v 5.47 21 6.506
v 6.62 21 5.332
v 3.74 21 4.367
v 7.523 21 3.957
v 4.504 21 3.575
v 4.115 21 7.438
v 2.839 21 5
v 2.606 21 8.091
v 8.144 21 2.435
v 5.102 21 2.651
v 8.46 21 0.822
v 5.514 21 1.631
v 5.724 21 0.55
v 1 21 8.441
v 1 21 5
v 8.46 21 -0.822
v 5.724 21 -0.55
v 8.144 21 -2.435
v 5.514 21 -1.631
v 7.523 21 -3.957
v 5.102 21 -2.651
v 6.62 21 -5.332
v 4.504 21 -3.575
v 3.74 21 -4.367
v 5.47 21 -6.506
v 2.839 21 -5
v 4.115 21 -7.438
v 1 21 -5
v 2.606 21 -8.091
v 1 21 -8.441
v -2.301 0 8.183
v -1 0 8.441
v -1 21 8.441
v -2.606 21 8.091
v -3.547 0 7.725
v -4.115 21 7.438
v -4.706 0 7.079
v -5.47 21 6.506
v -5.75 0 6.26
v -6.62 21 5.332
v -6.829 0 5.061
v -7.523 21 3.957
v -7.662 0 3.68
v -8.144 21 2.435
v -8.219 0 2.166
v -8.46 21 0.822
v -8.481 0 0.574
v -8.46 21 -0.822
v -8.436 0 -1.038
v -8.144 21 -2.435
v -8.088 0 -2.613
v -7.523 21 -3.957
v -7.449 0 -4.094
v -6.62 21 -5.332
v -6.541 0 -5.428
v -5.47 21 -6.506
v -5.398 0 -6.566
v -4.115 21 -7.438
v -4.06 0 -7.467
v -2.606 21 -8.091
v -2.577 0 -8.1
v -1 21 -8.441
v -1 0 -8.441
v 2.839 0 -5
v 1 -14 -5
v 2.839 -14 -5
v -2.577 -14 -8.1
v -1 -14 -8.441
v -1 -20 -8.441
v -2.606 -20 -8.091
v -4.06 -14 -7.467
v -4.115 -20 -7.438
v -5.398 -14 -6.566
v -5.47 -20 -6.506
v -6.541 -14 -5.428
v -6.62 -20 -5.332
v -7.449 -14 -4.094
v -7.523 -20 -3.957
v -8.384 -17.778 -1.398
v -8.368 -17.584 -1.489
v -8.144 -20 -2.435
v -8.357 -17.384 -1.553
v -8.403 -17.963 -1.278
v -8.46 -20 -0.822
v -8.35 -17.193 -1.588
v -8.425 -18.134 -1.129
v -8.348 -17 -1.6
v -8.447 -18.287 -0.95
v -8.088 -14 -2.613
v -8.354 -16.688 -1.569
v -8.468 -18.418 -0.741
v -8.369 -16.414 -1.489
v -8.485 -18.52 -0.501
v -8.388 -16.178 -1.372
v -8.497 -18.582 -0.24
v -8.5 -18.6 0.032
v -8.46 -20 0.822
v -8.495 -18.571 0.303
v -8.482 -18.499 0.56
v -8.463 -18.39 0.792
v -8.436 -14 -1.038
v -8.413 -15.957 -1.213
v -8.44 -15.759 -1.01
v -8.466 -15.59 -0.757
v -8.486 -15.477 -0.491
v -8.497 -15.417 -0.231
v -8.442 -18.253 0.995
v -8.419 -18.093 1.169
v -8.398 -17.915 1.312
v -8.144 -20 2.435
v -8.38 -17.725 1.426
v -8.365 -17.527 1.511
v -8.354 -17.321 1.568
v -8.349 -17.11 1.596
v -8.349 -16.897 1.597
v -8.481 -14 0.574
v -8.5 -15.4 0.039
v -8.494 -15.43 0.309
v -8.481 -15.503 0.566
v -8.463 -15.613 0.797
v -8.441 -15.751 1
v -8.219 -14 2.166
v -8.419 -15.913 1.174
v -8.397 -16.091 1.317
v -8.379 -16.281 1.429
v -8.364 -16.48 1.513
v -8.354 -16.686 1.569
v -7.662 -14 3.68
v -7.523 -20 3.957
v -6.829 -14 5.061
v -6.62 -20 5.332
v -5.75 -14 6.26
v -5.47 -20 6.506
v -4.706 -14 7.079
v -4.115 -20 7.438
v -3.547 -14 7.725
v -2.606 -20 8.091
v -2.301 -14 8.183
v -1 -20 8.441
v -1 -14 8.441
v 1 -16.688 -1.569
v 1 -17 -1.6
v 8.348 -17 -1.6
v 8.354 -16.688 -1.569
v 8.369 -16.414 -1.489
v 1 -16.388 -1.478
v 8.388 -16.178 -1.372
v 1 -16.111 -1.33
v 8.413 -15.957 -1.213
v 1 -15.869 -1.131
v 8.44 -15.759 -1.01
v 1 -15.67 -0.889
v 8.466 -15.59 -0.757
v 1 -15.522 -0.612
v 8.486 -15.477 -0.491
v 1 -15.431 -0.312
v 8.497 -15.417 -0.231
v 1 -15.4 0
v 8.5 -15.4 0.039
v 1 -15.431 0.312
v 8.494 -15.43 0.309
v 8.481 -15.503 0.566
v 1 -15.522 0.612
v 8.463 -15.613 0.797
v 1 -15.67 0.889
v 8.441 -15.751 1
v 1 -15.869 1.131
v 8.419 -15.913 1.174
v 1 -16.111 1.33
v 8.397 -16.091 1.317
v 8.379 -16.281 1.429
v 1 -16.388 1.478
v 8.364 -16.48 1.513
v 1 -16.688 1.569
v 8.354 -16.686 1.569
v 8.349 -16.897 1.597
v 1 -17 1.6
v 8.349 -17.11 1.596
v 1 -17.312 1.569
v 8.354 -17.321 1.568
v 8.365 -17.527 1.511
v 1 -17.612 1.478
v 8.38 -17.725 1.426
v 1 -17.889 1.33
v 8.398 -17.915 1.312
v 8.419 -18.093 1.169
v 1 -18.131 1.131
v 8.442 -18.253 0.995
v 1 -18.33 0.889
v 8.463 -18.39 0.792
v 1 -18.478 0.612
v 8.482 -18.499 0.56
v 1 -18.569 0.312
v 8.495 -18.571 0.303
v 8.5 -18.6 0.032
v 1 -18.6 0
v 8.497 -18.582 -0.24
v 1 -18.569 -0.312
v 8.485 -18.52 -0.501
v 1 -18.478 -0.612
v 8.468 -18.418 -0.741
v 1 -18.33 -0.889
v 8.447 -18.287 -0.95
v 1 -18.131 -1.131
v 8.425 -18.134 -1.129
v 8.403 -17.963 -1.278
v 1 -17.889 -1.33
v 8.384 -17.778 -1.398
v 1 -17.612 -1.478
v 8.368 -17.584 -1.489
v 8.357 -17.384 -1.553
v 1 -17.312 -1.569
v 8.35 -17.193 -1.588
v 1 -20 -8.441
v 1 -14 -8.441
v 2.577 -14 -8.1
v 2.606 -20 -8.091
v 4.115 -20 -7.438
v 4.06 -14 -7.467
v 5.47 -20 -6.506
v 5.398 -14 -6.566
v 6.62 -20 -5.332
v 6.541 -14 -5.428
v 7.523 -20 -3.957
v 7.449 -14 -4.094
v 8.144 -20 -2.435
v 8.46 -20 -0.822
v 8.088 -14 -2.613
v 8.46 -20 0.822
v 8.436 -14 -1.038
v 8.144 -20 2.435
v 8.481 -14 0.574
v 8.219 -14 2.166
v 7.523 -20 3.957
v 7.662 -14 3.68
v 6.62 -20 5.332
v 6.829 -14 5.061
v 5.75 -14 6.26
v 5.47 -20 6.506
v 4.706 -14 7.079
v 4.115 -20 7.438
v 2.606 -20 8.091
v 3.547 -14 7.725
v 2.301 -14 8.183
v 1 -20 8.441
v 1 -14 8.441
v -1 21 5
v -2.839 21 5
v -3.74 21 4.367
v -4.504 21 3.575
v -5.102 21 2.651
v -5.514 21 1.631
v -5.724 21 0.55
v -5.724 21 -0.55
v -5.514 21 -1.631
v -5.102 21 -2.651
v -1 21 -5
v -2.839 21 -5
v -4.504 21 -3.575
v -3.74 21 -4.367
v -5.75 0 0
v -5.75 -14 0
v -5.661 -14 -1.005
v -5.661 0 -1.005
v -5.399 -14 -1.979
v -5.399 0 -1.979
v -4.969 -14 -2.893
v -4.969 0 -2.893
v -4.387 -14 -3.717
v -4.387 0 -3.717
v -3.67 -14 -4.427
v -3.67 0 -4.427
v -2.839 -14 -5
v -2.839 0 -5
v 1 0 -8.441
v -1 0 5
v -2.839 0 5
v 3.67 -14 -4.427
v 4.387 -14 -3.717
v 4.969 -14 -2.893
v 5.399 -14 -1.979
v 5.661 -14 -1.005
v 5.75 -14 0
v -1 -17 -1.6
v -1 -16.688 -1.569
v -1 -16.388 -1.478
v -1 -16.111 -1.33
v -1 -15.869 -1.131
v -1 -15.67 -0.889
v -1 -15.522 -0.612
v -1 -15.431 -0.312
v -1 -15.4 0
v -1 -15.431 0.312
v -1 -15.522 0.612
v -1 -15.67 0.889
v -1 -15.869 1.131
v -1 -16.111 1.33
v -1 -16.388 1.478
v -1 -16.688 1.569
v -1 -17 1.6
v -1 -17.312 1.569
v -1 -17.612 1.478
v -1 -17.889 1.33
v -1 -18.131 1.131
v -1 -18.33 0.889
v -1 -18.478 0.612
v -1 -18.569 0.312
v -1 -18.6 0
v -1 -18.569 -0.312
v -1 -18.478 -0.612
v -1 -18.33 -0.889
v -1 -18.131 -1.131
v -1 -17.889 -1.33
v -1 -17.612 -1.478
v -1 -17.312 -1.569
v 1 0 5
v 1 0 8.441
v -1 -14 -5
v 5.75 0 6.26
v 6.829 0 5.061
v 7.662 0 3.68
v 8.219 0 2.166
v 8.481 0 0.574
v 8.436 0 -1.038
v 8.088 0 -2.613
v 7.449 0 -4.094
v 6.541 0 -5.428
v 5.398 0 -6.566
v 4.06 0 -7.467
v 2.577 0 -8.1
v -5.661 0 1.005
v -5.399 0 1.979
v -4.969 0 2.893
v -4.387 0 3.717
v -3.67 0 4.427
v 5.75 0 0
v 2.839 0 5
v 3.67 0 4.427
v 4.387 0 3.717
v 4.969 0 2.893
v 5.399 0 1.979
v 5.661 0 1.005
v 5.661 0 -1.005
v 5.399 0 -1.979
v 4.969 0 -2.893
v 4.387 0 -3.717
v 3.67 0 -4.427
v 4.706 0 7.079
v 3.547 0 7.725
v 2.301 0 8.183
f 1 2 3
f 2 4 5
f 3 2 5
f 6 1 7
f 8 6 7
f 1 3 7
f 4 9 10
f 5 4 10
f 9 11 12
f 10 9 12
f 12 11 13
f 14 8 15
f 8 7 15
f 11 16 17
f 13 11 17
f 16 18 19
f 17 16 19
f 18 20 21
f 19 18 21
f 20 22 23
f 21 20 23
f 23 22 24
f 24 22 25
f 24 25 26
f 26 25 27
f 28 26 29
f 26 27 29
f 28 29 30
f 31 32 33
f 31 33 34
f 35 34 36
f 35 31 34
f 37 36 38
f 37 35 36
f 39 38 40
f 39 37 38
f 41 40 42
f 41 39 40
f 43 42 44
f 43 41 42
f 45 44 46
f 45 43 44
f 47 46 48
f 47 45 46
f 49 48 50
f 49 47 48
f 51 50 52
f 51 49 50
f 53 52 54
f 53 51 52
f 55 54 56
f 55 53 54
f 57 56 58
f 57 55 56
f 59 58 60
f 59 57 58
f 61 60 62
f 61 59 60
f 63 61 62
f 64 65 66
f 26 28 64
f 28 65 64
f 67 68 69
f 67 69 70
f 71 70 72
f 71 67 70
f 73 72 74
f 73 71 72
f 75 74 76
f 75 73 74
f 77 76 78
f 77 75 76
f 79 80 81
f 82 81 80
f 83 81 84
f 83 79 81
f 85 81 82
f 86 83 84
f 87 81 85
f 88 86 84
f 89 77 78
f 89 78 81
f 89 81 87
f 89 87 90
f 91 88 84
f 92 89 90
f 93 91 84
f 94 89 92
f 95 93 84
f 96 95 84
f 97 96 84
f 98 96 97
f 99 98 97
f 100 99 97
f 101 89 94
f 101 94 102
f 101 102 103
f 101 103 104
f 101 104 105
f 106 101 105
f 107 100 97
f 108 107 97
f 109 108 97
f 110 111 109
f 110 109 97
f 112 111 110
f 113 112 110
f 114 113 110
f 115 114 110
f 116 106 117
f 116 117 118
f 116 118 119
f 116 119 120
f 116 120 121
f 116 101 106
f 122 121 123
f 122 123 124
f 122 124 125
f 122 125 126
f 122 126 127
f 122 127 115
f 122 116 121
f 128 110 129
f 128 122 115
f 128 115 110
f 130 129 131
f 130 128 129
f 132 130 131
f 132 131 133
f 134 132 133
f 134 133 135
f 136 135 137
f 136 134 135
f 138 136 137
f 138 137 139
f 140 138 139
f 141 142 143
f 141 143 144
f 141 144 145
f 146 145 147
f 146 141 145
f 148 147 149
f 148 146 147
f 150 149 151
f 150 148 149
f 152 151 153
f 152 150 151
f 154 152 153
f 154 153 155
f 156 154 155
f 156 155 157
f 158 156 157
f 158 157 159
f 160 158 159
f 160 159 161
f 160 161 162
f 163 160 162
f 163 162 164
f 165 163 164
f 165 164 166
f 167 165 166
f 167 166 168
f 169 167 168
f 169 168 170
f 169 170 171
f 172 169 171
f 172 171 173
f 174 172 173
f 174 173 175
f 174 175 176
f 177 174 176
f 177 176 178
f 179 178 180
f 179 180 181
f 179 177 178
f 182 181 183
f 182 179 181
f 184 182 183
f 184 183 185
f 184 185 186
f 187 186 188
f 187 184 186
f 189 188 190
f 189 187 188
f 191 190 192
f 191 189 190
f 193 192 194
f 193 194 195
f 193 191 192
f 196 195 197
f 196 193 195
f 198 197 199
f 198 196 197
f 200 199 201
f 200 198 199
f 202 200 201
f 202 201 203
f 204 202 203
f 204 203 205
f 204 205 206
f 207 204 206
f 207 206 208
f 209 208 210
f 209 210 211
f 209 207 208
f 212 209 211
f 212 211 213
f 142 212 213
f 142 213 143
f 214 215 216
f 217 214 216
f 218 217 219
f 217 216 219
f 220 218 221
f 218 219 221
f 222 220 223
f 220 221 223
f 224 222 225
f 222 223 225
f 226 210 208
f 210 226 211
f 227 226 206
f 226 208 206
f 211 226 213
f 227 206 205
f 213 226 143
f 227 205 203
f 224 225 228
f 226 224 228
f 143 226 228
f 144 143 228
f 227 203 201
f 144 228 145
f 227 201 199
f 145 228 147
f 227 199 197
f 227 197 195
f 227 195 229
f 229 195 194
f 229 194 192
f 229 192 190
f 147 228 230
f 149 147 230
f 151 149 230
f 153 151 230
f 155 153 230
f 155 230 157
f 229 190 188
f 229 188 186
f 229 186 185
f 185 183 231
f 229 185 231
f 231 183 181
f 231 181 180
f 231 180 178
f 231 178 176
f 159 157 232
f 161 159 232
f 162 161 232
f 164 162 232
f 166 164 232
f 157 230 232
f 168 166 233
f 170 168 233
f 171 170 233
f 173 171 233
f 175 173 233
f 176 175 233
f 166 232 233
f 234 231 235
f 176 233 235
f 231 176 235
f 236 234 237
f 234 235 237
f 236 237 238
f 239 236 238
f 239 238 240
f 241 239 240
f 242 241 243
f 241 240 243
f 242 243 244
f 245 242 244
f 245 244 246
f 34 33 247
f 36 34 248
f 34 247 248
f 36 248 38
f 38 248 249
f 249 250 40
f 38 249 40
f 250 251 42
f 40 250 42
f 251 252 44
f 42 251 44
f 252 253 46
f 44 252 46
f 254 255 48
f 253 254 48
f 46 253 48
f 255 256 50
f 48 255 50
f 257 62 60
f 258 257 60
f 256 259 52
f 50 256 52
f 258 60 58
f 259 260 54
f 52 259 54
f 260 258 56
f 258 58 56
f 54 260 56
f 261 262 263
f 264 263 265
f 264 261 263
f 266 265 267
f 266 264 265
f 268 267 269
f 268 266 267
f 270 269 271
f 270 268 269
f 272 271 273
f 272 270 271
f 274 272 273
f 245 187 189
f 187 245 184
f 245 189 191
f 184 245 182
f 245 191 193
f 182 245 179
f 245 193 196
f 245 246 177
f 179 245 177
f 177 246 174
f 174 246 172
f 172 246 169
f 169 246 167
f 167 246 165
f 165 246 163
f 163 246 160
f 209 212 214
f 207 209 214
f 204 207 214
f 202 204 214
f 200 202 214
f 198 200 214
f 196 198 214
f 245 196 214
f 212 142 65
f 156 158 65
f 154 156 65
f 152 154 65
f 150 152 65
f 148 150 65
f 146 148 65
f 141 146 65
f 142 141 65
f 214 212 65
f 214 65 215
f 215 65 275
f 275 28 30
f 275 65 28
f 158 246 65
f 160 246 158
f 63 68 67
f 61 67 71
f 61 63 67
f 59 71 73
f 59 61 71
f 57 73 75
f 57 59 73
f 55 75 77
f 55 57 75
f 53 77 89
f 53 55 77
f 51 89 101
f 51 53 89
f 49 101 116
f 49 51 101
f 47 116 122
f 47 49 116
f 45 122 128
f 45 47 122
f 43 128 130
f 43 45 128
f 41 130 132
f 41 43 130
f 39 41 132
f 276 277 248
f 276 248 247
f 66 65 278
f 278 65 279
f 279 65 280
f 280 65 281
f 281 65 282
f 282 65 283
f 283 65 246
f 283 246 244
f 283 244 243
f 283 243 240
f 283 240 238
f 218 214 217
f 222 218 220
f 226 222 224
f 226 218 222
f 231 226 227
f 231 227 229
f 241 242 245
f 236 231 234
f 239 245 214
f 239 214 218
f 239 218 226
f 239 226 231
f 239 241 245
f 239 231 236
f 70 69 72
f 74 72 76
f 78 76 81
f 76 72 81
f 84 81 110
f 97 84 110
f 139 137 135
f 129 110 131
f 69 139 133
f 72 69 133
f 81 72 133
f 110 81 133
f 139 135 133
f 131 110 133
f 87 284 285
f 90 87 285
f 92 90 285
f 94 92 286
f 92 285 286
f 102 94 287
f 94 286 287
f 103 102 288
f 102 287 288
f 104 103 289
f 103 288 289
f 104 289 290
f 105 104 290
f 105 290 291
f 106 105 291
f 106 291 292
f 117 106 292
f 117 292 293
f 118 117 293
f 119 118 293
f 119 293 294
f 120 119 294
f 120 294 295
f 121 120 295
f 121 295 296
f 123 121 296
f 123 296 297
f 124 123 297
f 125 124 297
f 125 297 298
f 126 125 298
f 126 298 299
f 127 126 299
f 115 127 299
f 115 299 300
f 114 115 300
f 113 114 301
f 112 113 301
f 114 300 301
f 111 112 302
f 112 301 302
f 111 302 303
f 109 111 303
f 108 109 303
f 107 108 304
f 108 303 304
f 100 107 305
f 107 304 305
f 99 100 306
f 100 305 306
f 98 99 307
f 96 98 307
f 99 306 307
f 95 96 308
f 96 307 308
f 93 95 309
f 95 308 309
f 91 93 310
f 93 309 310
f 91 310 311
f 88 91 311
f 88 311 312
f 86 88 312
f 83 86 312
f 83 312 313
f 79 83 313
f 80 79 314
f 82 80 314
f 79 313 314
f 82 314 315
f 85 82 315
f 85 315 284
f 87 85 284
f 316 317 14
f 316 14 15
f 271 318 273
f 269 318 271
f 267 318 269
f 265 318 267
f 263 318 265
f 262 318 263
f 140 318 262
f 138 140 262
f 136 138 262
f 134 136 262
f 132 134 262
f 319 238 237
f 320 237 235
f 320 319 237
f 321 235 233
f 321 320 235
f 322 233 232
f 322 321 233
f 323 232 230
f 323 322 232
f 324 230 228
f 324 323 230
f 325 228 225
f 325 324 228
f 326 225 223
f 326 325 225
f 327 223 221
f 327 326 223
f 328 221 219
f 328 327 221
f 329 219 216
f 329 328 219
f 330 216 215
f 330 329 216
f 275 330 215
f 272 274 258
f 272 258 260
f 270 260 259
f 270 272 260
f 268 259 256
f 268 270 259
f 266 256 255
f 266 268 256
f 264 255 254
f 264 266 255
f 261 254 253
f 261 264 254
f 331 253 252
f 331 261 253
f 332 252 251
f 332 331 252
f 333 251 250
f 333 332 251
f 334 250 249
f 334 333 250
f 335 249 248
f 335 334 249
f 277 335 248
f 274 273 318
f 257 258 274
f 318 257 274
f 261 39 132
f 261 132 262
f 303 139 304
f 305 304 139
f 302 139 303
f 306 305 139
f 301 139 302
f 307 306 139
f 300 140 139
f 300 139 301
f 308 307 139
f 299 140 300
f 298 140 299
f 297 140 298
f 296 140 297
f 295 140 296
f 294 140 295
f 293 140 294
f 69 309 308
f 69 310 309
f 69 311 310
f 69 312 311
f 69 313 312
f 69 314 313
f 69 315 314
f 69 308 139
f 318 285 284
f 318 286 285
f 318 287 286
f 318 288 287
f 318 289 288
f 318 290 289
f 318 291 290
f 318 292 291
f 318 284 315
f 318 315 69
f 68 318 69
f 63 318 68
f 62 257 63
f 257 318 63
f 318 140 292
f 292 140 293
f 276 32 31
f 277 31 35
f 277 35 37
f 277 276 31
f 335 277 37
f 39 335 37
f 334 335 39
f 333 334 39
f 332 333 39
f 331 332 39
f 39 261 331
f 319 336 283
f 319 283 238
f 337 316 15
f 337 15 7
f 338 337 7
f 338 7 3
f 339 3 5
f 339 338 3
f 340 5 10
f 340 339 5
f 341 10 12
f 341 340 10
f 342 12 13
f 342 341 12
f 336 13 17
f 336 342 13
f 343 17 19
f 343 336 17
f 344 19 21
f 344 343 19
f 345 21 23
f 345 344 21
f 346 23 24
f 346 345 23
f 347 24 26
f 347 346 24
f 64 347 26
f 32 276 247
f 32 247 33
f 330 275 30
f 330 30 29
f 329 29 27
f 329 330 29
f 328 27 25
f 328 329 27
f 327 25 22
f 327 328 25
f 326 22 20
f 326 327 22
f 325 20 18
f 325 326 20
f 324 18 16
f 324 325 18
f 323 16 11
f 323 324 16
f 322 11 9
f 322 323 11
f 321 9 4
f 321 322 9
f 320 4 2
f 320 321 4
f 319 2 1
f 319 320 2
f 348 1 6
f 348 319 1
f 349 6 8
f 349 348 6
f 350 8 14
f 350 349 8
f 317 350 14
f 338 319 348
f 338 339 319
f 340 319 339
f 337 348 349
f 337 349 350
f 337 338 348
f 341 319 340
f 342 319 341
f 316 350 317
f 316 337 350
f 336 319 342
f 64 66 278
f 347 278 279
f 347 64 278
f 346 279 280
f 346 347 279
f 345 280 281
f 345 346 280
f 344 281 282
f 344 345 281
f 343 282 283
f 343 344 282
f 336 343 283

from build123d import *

# Parameters (mm, degrees)
EXTRUDE_1_DEPTH          = 21
EXTRUDE_1_2_DEPTH        = 21
EXTRUDE_2_DEPTH          = 14
EXTRUDE_3_DEPTH          = 6
SKETCH_6_R               = 1.6
CUT_EXTRUDE_1_DEPTH      = 9.5
CUT_EXTRUDE_1_DEPTH_BACK = 9.5


with BuildPart() as part:
    # Эскиз1 → Бобышка-Вытянуть1 (new body)
    with BuildSketch(Plane(origin=(0, 0, 0), x_dir=(1, 0, 0), z_dir=(0, 1, 0))):
        with BuildLine():
            Line((2.839454173, 5), (1, 5))
            Line((1, 5), (1, 8.440971508))
            ThreePointArc((1, 8.440971508), (8.5, 0), (1, -8.440971508))
            Line((1, -8.440971508), (1, -5))
            Line((1, -5), (2.839454173, -5))
            ThreePointArc((2.839454173, -5), (5.75, 0), (2.839454173, 5))
        make_face()
    extrude(amount=EXTRUDE_1_DEPTH)



with BuildPart() as body_2:
    # Эскиз1 → Extrude 1 2 (new body)
    with BuildSketch(Plane(origin=(0, 0, 0), x_dir=(1, 0, 0), z_dir=(0, 1, 0))):
        with BuildLine():
            Line((-1, 8.440971508), (-1, 5))
            Line((-1, 5), (-2.839454173, 5))
            ThreePointArc((-2.839454173, 5), (-5.75, 0), (-2.839454173, -5))
            Line((-2.839454173, -5), (-1, -5))
            Line((-1, -5), (-1, -8.440971508))
            ThreePointArc((-1, -8.440971508), (-8.5, 0), (-1, 8.440971508))
        make_face()
    extrude(amount=EXTRUDE_1_2_DEPTH)


with BuildPart() as part_1:
    add(part.part)

    add(body_2.part)  # Бобышка-Вытянуть2 merges body 2
    # Эскиз3 → Бобышка-Вытянуть2 (add)
    with BuildSketch(Plane.XZ):
        with BuildLine():
            Line((1, -8.440971508), (1, -5))
            Line((1, -5), (2.839454173, -5))
            ThreePointArc((2.839454173, -5), (4.969374281, -2.892718316), (5.75, 0))
            Line((5.75, 0), (5.75, 6.259992013))
            ThreePointArc((5.75, 6.259992013), (8.088275905, -2.613387245), (1, -8.440971508))
        make_face()
        with BuildLine():
            Line((-2.839454173, -5), (-1, -5))
            Line((-1, -5), (-1, -8.440971508))
            ThreePointArc((-1, -8.440971508), (-8.088275905, -2.613387245), (-5.75, 6.259992013))
            Line((-5.75, 6.259992013), (-5.75, 0))
            ThreePointArc((-5.75, 0), (-4.969374281, -2.892718316), (-2.839454173, -5))
        make_face()
    extrude(amount=EXTRUDE_2_DEPTH)

    # Эскиз4 → Бобышка-Вытянуть3 (add)
    with BuildSketch(Plane.XZ.offset(14)):
        with BuildLine():
            Line((-1, 8.440971508), (-1, -8.440971508))
            ThreePointArc((-1, -8.440971508), (-8.5, 0), (-1, 8.440971508))
        make_face()
        with BuildLine():
            Line((1, 8.440971508), (1, -8.440971508))
            ThreePointArc((1, -8.440971508), (8.5, 0), (1, 8.440971508))
        make_face()
    extrude(amount=EXTRUDE_3_DEPTH)

    # Эскиз6 → Вырез-Вытянуть1 (cut, two sides)
    with BuildSketch(Plane(origin=(0, 0, 0), x_dir=(0, 0, -1), z_dir=(1, 0, 0))) as cut_extrude_1_sk:
        with Locations((0, -17)):
            Circle(SKETCH_6_R)
    extrude(amount=CUT_EXTRUDE_1_DEPTH, mode=Mode.SUBTRACT)
    extrude(cut_extrude_1_sk.sketch, amount=-CUT_EXTRUDE_1_DEPTH_BACK, mode=Mode.SUBTRACT)


solid = part_1.part
